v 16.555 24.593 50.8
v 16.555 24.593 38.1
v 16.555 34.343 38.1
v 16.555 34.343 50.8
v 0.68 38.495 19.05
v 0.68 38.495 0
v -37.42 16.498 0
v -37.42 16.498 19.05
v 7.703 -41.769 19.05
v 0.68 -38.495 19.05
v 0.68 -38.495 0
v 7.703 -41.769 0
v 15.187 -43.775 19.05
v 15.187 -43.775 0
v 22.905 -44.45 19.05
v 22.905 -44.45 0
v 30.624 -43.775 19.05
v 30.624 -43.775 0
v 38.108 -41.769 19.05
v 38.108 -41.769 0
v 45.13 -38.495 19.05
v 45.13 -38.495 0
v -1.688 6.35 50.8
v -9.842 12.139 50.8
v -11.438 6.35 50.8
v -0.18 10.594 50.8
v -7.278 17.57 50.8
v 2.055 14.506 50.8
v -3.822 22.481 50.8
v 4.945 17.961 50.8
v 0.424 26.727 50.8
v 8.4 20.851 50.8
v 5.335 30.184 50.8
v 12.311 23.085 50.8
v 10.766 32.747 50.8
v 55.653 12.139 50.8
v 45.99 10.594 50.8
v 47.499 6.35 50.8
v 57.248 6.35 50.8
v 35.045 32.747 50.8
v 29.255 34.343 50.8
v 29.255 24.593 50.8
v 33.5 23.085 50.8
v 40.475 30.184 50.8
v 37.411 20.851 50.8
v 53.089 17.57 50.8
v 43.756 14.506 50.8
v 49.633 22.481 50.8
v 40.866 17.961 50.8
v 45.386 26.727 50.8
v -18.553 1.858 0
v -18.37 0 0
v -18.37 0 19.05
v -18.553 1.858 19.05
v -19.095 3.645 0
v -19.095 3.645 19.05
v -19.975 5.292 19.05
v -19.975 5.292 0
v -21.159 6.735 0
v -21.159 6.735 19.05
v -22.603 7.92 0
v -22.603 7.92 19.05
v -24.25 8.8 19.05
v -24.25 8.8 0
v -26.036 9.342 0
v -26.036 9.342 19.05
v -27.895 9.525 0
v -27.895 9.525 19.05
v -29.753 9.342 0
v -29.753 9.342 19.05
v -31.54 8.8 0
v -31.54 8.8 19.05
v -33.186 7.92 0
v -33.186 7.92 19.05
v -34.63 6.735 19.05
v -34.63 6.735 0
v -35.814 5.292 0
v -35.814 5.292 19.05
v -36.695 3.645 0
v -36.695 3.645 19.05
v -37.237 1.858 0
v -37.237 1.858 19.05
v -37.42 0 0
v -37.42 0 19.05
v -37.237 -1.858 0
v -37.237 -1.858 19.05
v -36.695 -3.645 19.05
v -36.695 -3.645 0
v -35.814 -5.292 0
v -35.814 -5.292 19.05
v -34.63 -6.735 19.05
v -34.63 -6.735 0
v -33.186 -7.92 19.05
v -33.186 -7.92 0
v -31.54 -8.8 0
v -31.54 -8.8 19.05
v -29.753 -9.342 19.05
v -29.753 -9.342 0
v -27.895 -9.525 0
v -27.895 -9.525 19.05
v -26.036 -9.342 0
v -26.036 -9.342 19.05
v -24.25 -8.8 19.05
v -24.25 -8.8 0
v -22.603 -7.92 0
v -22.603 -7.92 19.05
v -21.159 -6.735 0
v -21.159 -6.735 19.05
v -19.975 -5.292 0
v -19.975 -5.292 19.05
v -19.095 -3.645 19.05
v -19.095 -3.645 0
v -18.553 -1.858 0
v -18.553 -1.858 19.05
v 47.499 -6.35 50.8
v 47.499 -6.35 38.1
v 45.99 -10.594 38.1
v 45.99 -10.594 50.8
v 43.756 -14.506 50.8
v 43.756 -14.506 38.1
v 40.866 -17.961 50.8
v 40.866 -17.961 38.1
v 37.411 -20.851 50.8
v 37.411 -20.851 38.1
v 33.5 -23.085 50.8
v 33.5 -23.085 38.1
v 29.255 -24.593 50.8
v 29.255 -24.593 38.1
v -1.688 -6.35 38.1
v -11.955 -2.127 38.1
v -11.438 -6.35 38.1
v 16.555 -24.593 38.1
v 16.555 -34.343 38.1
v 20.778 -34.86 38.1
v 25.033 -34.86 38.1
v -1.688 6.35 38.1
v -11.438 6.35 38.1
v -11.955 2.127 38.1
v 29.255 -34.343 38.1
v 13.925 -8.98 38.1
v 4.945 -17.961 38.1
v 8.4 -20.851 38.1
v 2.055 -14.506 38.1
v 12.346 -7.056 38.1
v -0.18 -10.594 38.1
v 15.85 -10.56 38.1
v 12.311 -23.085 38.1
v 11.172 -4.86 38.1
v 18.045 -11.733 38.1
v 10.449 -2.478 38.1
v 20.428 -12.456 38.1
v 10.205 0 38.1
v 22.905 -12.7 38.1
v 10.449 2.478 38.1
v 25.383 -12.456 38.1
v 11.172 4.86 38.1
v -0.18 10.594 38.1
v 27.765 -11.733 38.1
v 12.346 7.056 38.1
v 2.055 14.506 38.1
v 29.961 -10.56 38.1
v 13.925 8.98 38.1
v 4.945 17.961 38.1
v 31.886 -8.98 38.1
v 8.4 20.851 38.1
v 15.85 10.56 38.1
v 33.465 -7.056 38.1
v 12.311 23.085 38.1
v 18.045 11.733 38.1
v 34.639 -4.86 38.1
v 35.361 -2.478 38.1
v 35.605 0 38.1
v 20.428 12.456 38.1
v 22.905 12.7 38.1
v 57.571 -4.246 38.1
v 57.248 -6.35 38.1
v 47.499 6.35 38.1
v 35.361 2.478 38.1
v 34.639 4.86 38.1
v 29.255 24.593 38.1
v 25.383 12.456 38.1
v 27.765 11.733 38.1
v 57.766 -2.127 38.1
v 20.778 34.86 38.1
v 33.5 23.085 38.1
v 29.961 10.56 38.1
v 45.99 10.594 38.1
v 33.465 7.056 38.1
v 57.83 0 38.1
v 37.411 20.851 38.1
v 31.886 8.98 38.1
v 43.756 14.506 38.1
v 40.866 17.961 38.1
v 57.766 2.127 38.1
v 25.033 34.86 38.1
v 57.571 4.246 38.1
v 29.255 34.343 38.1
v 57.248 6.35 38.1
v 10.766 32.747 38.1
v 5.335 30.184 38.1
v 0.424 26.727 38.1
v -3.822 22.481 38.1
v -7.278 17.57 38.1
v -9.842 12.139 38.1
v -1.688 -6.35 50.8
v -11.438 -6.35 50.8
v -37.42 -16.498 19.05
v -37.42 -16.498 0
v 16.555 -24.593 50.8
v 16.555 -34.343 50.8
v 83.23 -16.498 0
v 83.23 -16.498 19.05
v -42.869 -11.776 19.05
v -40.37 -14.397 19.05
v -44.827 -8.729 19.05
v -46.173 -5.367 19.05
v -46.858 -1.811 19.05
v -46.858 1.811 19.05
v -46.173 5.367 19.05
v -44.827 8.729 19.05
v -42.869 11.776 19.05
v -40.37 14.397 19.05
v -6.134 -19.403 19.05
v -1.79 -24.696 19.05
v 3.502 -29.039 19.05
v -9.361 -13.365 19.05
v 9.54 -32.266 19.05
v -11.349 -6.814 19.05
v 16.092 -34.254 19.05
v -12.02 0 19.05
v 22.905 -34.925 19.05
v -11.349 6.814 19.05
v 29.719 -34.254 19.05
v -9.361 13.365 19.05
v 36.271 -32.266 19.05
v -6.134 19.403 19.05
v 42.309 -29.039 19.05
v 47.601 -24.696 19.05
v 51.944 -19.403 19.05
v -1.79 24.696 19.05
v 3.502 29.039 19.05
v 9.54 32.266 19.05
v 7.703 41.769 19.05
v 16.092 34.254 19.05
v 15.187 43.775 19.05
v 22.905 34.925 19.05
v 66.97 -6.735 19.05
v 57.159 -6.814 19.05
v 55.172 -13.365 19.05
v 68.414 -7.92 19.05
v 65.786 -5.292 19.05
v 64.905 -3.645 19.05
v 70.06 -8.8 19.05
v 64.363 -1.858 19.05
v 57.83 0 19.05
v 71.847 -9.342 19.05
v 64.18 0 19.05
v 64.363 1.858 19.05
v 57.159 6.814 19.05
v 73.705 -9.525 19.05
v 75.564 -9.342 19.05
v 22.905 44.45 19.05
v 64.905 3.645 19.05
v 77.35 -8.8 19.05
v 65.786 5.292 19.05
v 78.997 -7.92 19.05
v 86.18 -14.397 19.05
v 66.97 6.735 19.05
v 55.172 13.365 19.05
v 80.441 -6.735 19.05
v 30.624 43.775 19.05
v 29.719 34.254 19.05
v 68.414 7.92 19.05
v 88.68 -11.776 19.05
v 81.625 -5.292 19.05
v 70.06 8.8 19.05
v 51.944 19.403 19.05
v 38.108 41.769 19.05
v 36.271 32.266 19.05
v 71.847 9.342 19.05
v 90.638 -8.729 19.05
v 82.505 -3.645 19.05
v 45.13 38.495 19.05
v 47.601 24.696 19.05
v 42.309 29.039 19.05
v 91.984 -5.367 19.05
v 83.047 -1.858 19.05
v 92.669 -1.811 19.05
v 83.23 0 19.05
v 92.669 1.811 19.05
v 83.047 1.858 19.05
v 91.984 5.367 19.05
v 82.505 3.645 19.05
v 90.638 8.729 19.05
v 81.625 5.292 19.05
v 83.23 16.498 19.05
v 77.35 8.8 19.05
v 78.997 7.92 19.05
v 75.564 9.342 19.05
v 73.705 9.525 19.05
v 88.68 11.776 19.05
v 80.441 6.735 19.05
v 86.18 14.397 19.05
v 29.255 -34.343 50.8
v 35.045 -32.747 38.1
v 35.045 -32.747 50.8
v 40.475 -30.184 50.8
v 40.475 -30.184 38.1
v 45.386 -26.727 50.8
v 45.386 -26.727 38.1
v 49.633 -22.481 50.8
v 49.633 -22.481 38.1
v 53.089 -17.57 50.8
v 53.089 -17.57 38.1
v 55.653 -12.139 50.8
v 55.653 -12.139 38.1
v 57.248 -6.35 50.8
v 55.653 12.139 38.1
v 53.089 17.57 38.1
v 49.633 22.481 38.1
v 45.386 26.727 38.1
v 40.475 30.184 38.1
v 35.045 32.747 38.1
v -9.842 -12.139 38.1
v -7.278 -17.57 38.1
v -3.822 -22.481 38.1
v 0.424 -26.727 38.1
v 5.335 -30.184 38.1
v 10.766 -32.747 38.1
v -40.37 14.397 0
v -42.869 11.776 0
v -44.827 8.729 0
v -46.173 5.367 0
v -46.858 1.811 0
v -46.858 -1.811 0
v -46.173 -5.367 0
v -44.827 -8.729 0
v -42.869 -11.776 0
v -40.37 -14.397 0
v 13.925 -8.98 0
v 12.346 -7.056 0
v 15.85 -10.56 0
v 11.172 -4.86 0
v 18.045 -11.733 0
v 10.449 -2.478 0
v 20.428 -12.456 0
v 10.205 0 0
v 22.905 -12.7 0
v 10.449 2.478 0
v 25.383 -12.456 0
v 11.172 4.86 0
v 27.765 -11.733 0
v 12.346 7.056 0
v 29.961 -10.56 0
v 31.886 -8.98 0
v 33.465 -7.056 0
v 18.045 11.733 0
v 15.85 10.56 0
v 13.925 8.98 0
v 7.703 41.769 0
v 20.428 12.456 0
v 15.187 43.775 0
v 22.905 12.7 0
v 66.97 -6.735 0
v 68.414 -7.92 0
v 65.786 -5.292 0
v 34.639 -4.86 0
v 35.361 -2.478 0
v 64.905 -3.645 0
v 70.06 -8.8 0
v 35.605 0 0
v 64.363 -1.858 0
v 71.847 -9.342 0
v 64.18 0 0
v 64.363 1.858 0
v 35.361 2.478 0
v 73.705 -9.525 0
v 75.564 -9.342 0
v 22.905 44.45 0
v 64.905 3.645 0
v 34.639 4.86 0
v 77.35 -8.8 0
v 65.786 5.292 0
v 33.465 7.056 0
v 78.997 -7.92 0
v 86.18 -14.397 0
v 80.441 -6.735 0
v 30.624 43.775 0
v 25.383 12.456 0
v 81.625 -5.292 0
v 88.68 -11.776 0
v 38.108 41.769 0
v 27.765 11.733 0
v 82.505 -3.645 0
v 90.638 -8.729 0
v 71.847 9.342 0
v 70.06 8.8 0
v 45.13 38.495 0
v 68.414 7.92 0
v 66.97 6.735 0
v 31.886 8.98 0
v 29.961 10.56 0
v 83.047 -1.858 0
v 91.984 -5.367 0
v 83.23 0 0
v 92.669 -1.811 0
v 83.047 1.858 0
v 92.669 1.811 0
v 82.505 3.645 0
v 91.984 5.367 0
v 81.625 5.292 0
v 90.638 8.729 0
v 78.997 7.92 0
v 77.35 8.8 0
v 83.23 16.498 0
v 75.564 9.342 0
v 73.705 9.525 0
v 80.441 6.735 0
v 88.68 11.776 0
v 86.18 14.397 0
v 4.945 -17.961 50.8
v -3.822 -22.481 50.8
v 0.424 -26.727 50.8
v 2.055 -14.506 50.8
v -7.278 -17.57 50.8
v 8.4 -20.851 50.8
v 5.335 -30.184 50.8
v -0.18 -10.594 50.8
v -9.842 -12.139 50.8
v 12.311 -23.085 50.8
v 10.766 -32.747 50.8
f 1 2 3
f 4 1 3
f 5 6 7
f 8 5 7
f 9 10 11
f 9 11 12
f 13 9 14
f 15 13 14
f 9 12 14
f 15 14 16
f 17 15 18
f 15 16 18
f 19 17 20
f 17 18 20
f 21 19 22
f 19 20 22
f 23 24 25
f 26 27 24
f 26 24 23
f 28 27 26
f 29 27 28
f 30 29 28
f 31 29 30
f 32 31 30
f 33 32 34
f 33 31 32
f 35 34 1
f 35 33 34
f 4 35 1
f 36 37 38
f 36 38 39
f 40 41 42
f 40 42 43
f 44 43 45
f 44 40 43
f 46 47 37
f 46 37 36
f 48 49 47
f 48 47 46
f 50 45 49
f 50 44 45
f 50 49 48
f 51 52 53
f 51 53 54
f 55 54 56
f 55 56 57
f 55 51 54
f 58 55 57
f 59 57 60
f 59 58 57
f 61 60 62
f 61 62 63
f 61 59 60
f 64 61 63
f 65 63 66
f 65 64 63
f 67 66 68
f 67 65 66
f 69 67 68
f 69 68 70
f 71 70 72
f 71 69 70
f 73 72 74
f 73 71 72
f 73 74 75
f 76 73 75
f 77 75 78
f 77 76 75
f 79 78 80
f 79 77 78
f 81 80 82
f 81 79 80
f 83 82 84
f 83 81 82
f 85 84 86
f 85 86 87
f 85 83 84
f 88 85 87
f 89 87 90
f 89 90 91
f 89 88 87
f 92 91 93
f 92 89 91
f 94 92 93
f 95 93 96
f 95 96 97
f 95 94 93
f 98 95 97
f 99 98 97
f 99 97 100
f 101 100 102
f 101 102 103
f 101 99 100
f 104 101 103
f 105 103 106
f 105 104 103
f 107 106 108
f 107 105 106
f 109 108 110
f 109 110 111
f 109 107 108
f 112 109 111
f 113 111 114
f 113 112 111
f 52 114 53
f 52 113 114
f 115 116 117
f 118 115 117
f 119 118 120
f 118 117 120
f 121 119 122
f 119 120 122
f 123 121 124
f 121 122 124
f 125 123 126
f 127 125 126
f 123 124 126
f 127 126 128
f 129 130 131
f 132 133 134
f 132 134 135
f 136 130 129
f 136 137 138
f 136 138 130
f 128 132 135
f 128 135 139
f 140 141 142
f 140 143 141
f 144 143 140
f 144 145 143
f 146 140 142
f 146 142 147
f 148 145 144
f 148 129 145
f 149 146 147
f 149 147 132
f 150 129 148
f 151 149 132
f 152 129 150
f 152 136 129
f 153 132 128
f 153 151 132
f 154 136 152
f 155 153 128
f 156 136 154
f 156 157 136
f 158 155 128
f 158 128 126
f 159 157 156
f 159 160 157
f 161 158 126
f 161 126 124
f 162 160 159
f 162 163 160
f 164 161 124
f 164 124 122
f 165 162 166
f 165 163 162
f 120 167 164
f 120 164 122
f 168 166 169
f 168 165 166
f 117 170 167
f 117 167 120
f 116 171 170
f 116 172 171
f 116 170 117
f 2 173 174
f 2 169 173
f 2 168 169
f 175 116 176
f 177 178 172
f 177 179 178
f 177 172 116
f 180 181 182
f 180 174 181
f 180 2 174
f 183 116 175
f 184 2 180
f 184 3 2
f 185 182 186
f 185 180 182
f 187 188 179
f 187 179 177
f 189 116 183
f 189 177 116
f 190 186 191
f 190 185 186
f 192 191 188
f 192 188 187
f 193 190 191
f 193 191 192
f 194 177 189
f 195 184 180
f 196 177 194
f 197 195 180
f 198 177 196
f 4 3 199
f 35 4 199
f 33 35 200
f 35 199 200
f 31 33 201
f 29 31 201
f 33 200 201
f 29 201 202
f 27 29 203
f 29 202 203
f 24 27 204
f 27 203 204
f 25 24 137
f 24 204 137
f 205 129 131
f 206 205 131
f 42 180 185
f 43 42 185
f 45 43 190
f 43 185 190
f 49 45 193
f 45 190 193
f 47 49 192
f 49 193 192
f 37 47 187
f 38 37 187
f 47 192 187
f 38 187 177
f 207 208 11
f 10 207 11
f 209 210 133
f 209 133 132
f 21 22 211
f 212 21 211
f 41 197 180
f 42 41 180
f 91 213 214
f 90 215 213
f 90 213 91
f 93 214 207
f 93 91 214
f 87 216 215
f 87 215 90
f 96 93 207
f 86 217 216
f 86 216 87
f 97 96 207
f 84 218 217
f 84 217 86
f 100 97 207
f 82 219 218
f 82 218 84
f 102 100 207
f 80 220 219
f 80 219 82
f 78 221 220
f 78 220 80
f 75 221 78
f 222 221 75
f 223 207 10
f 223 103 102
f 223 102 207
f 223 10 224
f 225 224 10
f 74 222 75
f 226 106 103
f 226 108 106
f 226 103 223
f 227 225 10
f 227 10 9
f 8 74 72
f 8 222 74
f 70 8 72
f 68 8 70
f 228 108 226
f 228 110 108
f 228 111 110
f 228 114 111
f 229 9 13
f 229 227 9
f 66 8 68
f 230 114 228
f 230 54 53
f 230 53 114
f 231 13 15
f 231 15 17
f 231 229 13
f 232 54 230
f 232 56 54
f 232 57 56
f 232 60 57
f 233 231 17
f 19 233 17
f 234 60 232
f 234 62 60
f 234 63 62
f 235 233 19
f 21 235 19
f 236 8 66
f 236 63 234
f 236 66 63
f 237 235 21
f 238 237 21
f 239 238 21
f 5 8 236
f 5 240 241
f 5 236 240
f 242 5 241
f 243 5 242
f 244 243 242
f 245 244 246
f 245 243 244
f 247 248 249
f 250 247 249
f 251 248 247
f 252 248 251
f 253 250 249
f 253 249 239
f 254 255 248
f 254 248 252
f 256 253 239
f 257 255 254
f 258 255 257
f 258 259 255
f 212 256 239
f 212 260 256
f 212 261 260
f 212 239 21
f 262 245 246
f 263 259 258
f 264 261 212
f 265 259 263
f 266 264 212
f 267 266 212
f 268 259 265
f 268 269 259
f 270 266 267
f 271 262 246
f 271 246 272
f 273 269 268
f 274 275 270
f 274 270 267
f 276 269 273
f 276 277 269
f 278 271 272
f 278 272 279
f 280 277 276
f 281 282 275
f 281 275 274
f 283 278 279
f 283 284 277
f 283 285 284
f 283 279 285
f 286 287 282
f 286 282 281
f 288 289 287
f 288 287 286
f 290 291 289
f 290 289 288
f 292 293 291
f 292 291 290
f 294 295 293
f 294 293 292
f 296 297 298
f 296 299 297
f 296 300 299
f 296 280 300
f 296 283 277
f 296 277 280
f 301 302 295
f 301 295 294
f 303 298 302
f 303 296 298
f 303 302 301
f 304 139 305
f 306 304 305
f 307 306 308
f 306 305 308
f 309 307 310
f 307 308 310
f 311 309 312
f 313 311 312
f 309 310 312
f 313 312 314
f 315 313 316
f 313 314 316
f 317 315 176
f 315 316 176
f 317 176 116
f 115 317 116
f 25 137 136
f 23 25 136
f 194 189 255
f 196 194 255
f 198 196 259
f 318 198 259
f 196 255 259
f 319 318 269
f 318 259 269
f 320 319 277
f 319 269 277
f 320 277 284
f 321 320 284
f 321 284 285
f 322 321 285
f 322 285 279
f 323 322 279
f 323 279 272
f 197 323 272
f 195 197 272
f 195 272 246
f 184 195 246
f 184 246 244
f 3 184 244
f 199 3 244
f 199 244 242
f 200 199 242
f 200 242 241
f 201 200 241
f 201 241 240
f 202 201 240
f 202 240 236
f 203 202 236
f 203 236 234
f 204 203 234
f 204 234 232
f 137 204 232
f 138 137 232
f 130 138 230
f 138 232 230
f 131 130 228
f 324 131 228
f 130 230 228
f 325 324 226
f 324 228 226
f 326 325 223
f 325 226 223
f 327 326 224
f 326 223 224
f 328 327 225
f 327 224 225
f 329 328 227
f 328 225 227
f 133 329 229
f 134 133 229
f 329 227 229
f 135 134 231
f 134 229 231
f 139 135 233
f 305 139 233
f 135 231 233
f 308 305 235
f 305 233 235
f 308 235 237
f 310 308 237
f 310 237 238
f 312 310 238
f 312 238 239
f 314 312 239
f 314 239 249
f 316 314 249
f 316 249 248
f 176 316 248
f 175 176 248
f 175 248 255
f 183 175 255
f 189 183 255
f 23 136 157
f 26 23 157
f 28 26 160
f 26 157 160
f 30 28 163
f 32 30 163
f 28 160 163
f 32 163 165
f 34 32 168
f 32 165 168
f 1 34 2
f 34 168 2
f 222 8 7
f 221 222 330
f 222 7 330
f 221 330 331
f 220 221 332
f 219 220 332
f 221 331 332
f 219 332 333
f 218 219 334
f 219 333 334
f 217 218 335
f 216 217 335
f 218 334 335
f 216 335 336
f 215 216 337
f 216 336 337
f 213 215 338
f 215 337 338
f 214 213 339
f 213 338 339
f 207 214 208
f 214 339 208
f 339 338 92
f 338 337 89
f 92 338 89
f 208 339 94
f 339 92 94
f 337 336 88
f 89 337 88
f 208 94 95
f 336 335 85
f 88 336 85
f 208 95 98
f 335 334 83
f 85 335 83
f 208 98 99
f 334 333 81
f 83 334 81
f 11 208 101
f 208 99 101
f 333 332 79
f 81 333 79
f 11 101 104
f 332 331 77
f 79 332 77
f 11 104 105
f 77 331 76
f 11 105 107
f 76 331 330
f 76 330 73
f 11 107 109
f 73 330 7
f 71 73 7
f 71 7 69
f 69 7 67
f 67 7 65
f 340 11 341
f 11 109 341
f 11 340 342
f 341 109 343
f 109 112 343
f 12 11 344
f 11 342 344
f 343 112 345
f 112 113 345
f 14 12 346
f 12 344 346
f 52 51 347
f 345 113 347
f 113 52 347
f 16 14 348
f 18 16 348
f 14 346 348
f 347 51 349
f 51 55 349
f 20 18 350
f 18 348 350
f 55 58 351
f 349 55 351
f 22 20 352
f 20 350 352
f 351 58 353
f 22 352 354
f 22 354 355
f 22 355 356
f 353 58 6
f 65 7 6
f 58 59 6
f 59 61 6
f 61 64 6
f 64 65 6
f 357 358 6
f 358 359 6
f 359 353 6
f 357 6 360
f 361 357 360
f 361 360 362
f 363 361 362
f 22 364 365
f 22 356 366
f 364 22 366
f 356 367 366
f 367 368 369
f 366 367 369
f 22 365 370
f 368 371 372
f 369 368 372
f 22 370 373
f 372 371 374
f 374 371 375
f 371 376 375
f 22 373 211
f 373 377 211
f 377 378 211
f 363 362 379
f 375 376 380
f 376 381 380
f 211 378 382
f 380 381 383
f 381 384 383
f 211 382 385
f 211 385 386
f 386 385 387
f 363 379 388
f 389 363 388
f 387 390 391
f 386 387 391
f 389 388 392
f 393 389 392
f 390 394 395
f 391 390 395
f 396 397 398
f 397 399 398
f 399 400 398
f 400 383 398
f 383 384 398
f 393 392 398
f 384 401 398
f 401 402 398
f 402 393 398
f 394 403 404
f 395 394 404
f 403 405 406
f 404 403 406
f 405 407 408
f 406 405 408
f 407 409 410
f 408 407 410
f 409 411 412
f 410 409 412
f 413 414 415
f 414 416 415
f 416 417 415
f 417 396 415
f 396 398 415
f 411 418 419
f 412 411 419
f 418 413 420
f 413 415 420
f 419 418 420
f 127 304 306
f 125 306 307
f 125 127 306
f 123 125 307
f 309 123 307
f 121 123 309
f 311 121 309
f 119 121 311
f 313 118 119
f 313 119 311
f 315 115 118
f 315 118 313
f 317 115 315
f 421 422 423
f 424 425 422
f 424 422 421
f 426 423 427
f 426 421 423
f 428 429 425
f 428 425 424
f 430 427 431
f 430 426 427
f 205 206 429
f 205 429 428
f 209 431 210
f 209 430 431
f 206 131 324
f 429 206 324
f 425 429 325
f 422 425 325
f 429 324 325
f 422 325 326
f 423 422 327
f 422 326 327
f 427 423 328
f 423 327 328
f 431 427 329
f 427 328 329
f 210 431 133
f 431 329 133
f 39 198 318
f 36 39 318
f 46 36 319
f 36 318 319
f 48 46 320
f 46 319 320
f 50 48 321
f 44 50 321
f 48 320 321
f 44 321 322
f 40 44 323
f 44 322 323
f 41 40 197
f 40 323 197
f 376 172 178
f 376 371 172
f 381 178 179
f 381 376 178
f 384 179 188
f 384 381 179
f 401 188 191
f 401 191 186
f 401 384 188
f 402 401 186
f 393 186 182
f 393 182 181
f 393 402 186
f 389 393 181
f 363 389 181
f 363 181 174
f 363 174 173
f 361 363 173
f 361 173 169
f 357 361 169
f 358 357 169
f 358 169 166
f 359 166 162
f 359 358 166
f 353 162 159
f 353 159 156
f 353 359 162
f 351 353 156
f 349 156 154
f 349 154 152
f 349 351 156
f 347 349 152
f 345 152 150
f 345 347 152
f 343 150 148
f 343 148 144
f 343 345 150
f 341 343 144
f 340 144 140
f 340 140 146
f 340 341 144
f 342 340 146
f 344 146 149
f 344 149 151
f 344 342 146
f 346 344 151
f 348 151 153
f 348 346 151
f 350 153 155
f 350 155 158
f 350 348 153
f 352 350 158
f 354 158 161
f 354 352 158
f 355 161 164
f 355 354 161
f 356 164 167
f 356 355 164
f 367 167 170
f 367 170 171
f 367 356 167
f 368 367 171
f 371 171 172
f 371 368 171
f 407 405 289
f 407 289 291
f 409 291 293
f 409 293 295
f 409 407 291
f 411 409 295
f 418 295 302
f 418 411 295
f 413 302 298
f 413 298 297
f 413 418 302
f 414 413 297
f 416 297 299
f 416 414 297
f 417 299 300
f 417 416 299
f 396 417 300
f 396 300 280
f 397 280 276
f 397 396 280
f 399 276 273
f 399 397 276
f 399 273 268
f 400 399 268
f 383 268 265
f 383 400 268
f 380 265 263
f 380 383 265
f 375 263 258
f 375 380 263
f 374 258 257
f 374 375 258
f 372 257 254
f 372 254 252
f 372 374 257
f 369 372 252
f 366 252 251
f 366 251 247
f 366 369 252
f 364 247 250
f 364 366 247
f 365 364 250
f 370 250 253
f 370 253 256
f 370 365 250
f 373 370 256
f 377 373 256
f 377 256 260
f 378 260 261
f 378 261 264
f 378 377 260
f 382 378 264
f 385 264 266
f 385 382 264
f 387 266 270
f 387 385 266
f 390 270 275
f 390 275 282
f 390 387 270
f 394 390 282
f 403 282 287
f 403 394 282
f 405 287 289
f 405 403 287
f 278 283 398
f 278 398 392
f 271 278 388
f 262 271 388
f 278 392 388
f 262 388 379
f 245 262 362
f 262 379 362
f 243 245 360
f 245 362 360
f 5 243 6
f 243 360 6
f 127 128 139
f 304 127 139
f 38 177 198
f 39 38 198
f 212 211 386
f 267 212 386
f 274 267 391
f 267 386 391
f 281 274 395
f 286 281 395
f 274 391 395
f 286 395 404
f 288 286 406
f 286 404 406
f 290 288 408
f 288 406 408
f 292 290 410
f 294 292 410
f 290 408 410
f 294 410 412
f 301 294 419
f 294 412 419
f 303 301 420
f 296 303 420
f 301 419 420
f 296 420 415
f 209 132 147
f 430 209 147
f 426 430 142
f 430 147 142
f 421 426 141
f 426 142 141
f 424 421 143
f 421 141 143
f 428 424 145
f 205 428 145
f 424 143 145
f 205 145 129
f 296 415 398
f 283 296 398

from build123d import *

# Parameters (mm, degrees)
F0_R     = 9.525
F0_R_2   = 12.7
F1_DEPTH = 19.05
F2_R     = 34.925
F2_R_2   = 12.7
F3_DEPTH = 19.05
F5_DEPTH = 12.7


with BuildPart() as f1:
    # F0 (on Top) → F1 (new body)
    with BuildSketch(Plane.XY):
        with BuildLine():
            Line((-37.419644, -16.497784), (0.680356, -38.494829))
            ThreePointArc((0.680356, -38.494829), (22.905356, -44.45), (45.130356, -38.494829))
            Line((45.130356, -38.494829), (83.230356, -16.497784))
            ThreePointArc((83.230356, -16.497784), (92.755356, 0), (83.230356, 16.497784))
            Line((83.230356, 16.497784), (45.130356, 38.494829))
            ThreePointArc((45.130356, 38.494829), (22.905356, 44.45), (0.680356, 38.494829))
            Line((0.680356, 38.494829), (-37.419644, 16.497784))
            ThreePointArc((-37.419644, 16.497784), (-46.944644, 0), (-37.419644, -16.497784))
        make_face()
        with Locations((-27.894644, 0)):
            Circle(F0_R, mode=Mode.SUBTRACT)
        with Locations((22.905356, 0)):
            Circle(F0_R_2, mode=Mode.SUBTRACT)
        with Locations((73.705356, 0)):
            Circle(F0_R, mode=Mode.SUBTRACT)
    extrude(amount=F1_DEPTH)

    # F2 (on face) → F3 (join)
    with BuildSketch(Plane.XY.offset(19.05)):
        with Locations((22.905356, 0)):
            Circle(F2_R)
        with Locations((22.905356, 0)):
            Circle(F2_R_2, mode=Mode.SUBTRACT)
    extrude(amount=F3_DEPTH)

    # F4 (on face) → F5 (join)
    with BuildSketch(Plane.XY.offset(38.1)):
        with BuildLine():
            Line((53.067856, 6.35), (57.248232, 6.35))
            ThreePointArc((57.248232, 6.35), (47.60106, 24.695704), (29.255356, 34.342876))
            Line((29.255356, 34.342876), (29.255356, 30.1625))
            Line((29.255356, 30.1625), (29.255356, 24.593444))
            ThreePointArc((29.255356, 24.593444), (40.865868, 17.960512), (47.4988, 6.35))
            Line((47.4988, 6.35), (53.067856, 6.35))
        make_face()
        with BuildLine():
            Line((29.255356, -24.593444), (29.255356, -30.1625))
            Line((29.255356, -30.1625), (29.255356, -34.342876))
            ThreePointArc((29.255356, -34.342876), (47.60106, -24.695704), (57.248232, -6.35))
            Line((57.248232, -6.35), (53.067856, -6.35))
            Line((53.067856, -6.35), (47.4988, -6.35))
            ThreePointArc((47.4988, -6.35), (40.865868, -17.960512), (29.255356, -24.593444))
        make_face()
        with BuildLine():
            Line((16.555356, -34.342876), (16.555356, -30.1625))
            Line((16.555356, -30.1625), (16.555356, -24.593444))
            ThreePointArc((16.555356, -24.593444), (4.944843, -17.960512), (-1.688089, -6.35))
            Line((-1.688089, -6.35), (-7.257144, -6.35))
            Line((-7.257144, -6.35), (-11.43752, -6.35))
            ThreePointArc((-11.43752, -6.35), (-1.790349, -24.695704), (16.555356, -34.342876))
        make_face()
        with BuildLine():
            Line((-11.43752, 6.35), (-7.257144, 6.35))
            Line((-7.257144, 6.35), (-1.688089, 6.35))
            ThreePointArc((-1.688089, 6.35), (4.944843, 17.960512), (16.555356, 24.593444))
            Line((16.555356, 24.593444), (16.555356, 30.1625))
            Line((16.555356, 30.1625), (16.555356, 34.342876))
            ThreePointArc((16.555356, 34.342876), (-1.790349, 24.695704), (-11.43752, 6.35))
        make_face()
    extrude(amount=F5_DEPTH)


solid = f1.part
